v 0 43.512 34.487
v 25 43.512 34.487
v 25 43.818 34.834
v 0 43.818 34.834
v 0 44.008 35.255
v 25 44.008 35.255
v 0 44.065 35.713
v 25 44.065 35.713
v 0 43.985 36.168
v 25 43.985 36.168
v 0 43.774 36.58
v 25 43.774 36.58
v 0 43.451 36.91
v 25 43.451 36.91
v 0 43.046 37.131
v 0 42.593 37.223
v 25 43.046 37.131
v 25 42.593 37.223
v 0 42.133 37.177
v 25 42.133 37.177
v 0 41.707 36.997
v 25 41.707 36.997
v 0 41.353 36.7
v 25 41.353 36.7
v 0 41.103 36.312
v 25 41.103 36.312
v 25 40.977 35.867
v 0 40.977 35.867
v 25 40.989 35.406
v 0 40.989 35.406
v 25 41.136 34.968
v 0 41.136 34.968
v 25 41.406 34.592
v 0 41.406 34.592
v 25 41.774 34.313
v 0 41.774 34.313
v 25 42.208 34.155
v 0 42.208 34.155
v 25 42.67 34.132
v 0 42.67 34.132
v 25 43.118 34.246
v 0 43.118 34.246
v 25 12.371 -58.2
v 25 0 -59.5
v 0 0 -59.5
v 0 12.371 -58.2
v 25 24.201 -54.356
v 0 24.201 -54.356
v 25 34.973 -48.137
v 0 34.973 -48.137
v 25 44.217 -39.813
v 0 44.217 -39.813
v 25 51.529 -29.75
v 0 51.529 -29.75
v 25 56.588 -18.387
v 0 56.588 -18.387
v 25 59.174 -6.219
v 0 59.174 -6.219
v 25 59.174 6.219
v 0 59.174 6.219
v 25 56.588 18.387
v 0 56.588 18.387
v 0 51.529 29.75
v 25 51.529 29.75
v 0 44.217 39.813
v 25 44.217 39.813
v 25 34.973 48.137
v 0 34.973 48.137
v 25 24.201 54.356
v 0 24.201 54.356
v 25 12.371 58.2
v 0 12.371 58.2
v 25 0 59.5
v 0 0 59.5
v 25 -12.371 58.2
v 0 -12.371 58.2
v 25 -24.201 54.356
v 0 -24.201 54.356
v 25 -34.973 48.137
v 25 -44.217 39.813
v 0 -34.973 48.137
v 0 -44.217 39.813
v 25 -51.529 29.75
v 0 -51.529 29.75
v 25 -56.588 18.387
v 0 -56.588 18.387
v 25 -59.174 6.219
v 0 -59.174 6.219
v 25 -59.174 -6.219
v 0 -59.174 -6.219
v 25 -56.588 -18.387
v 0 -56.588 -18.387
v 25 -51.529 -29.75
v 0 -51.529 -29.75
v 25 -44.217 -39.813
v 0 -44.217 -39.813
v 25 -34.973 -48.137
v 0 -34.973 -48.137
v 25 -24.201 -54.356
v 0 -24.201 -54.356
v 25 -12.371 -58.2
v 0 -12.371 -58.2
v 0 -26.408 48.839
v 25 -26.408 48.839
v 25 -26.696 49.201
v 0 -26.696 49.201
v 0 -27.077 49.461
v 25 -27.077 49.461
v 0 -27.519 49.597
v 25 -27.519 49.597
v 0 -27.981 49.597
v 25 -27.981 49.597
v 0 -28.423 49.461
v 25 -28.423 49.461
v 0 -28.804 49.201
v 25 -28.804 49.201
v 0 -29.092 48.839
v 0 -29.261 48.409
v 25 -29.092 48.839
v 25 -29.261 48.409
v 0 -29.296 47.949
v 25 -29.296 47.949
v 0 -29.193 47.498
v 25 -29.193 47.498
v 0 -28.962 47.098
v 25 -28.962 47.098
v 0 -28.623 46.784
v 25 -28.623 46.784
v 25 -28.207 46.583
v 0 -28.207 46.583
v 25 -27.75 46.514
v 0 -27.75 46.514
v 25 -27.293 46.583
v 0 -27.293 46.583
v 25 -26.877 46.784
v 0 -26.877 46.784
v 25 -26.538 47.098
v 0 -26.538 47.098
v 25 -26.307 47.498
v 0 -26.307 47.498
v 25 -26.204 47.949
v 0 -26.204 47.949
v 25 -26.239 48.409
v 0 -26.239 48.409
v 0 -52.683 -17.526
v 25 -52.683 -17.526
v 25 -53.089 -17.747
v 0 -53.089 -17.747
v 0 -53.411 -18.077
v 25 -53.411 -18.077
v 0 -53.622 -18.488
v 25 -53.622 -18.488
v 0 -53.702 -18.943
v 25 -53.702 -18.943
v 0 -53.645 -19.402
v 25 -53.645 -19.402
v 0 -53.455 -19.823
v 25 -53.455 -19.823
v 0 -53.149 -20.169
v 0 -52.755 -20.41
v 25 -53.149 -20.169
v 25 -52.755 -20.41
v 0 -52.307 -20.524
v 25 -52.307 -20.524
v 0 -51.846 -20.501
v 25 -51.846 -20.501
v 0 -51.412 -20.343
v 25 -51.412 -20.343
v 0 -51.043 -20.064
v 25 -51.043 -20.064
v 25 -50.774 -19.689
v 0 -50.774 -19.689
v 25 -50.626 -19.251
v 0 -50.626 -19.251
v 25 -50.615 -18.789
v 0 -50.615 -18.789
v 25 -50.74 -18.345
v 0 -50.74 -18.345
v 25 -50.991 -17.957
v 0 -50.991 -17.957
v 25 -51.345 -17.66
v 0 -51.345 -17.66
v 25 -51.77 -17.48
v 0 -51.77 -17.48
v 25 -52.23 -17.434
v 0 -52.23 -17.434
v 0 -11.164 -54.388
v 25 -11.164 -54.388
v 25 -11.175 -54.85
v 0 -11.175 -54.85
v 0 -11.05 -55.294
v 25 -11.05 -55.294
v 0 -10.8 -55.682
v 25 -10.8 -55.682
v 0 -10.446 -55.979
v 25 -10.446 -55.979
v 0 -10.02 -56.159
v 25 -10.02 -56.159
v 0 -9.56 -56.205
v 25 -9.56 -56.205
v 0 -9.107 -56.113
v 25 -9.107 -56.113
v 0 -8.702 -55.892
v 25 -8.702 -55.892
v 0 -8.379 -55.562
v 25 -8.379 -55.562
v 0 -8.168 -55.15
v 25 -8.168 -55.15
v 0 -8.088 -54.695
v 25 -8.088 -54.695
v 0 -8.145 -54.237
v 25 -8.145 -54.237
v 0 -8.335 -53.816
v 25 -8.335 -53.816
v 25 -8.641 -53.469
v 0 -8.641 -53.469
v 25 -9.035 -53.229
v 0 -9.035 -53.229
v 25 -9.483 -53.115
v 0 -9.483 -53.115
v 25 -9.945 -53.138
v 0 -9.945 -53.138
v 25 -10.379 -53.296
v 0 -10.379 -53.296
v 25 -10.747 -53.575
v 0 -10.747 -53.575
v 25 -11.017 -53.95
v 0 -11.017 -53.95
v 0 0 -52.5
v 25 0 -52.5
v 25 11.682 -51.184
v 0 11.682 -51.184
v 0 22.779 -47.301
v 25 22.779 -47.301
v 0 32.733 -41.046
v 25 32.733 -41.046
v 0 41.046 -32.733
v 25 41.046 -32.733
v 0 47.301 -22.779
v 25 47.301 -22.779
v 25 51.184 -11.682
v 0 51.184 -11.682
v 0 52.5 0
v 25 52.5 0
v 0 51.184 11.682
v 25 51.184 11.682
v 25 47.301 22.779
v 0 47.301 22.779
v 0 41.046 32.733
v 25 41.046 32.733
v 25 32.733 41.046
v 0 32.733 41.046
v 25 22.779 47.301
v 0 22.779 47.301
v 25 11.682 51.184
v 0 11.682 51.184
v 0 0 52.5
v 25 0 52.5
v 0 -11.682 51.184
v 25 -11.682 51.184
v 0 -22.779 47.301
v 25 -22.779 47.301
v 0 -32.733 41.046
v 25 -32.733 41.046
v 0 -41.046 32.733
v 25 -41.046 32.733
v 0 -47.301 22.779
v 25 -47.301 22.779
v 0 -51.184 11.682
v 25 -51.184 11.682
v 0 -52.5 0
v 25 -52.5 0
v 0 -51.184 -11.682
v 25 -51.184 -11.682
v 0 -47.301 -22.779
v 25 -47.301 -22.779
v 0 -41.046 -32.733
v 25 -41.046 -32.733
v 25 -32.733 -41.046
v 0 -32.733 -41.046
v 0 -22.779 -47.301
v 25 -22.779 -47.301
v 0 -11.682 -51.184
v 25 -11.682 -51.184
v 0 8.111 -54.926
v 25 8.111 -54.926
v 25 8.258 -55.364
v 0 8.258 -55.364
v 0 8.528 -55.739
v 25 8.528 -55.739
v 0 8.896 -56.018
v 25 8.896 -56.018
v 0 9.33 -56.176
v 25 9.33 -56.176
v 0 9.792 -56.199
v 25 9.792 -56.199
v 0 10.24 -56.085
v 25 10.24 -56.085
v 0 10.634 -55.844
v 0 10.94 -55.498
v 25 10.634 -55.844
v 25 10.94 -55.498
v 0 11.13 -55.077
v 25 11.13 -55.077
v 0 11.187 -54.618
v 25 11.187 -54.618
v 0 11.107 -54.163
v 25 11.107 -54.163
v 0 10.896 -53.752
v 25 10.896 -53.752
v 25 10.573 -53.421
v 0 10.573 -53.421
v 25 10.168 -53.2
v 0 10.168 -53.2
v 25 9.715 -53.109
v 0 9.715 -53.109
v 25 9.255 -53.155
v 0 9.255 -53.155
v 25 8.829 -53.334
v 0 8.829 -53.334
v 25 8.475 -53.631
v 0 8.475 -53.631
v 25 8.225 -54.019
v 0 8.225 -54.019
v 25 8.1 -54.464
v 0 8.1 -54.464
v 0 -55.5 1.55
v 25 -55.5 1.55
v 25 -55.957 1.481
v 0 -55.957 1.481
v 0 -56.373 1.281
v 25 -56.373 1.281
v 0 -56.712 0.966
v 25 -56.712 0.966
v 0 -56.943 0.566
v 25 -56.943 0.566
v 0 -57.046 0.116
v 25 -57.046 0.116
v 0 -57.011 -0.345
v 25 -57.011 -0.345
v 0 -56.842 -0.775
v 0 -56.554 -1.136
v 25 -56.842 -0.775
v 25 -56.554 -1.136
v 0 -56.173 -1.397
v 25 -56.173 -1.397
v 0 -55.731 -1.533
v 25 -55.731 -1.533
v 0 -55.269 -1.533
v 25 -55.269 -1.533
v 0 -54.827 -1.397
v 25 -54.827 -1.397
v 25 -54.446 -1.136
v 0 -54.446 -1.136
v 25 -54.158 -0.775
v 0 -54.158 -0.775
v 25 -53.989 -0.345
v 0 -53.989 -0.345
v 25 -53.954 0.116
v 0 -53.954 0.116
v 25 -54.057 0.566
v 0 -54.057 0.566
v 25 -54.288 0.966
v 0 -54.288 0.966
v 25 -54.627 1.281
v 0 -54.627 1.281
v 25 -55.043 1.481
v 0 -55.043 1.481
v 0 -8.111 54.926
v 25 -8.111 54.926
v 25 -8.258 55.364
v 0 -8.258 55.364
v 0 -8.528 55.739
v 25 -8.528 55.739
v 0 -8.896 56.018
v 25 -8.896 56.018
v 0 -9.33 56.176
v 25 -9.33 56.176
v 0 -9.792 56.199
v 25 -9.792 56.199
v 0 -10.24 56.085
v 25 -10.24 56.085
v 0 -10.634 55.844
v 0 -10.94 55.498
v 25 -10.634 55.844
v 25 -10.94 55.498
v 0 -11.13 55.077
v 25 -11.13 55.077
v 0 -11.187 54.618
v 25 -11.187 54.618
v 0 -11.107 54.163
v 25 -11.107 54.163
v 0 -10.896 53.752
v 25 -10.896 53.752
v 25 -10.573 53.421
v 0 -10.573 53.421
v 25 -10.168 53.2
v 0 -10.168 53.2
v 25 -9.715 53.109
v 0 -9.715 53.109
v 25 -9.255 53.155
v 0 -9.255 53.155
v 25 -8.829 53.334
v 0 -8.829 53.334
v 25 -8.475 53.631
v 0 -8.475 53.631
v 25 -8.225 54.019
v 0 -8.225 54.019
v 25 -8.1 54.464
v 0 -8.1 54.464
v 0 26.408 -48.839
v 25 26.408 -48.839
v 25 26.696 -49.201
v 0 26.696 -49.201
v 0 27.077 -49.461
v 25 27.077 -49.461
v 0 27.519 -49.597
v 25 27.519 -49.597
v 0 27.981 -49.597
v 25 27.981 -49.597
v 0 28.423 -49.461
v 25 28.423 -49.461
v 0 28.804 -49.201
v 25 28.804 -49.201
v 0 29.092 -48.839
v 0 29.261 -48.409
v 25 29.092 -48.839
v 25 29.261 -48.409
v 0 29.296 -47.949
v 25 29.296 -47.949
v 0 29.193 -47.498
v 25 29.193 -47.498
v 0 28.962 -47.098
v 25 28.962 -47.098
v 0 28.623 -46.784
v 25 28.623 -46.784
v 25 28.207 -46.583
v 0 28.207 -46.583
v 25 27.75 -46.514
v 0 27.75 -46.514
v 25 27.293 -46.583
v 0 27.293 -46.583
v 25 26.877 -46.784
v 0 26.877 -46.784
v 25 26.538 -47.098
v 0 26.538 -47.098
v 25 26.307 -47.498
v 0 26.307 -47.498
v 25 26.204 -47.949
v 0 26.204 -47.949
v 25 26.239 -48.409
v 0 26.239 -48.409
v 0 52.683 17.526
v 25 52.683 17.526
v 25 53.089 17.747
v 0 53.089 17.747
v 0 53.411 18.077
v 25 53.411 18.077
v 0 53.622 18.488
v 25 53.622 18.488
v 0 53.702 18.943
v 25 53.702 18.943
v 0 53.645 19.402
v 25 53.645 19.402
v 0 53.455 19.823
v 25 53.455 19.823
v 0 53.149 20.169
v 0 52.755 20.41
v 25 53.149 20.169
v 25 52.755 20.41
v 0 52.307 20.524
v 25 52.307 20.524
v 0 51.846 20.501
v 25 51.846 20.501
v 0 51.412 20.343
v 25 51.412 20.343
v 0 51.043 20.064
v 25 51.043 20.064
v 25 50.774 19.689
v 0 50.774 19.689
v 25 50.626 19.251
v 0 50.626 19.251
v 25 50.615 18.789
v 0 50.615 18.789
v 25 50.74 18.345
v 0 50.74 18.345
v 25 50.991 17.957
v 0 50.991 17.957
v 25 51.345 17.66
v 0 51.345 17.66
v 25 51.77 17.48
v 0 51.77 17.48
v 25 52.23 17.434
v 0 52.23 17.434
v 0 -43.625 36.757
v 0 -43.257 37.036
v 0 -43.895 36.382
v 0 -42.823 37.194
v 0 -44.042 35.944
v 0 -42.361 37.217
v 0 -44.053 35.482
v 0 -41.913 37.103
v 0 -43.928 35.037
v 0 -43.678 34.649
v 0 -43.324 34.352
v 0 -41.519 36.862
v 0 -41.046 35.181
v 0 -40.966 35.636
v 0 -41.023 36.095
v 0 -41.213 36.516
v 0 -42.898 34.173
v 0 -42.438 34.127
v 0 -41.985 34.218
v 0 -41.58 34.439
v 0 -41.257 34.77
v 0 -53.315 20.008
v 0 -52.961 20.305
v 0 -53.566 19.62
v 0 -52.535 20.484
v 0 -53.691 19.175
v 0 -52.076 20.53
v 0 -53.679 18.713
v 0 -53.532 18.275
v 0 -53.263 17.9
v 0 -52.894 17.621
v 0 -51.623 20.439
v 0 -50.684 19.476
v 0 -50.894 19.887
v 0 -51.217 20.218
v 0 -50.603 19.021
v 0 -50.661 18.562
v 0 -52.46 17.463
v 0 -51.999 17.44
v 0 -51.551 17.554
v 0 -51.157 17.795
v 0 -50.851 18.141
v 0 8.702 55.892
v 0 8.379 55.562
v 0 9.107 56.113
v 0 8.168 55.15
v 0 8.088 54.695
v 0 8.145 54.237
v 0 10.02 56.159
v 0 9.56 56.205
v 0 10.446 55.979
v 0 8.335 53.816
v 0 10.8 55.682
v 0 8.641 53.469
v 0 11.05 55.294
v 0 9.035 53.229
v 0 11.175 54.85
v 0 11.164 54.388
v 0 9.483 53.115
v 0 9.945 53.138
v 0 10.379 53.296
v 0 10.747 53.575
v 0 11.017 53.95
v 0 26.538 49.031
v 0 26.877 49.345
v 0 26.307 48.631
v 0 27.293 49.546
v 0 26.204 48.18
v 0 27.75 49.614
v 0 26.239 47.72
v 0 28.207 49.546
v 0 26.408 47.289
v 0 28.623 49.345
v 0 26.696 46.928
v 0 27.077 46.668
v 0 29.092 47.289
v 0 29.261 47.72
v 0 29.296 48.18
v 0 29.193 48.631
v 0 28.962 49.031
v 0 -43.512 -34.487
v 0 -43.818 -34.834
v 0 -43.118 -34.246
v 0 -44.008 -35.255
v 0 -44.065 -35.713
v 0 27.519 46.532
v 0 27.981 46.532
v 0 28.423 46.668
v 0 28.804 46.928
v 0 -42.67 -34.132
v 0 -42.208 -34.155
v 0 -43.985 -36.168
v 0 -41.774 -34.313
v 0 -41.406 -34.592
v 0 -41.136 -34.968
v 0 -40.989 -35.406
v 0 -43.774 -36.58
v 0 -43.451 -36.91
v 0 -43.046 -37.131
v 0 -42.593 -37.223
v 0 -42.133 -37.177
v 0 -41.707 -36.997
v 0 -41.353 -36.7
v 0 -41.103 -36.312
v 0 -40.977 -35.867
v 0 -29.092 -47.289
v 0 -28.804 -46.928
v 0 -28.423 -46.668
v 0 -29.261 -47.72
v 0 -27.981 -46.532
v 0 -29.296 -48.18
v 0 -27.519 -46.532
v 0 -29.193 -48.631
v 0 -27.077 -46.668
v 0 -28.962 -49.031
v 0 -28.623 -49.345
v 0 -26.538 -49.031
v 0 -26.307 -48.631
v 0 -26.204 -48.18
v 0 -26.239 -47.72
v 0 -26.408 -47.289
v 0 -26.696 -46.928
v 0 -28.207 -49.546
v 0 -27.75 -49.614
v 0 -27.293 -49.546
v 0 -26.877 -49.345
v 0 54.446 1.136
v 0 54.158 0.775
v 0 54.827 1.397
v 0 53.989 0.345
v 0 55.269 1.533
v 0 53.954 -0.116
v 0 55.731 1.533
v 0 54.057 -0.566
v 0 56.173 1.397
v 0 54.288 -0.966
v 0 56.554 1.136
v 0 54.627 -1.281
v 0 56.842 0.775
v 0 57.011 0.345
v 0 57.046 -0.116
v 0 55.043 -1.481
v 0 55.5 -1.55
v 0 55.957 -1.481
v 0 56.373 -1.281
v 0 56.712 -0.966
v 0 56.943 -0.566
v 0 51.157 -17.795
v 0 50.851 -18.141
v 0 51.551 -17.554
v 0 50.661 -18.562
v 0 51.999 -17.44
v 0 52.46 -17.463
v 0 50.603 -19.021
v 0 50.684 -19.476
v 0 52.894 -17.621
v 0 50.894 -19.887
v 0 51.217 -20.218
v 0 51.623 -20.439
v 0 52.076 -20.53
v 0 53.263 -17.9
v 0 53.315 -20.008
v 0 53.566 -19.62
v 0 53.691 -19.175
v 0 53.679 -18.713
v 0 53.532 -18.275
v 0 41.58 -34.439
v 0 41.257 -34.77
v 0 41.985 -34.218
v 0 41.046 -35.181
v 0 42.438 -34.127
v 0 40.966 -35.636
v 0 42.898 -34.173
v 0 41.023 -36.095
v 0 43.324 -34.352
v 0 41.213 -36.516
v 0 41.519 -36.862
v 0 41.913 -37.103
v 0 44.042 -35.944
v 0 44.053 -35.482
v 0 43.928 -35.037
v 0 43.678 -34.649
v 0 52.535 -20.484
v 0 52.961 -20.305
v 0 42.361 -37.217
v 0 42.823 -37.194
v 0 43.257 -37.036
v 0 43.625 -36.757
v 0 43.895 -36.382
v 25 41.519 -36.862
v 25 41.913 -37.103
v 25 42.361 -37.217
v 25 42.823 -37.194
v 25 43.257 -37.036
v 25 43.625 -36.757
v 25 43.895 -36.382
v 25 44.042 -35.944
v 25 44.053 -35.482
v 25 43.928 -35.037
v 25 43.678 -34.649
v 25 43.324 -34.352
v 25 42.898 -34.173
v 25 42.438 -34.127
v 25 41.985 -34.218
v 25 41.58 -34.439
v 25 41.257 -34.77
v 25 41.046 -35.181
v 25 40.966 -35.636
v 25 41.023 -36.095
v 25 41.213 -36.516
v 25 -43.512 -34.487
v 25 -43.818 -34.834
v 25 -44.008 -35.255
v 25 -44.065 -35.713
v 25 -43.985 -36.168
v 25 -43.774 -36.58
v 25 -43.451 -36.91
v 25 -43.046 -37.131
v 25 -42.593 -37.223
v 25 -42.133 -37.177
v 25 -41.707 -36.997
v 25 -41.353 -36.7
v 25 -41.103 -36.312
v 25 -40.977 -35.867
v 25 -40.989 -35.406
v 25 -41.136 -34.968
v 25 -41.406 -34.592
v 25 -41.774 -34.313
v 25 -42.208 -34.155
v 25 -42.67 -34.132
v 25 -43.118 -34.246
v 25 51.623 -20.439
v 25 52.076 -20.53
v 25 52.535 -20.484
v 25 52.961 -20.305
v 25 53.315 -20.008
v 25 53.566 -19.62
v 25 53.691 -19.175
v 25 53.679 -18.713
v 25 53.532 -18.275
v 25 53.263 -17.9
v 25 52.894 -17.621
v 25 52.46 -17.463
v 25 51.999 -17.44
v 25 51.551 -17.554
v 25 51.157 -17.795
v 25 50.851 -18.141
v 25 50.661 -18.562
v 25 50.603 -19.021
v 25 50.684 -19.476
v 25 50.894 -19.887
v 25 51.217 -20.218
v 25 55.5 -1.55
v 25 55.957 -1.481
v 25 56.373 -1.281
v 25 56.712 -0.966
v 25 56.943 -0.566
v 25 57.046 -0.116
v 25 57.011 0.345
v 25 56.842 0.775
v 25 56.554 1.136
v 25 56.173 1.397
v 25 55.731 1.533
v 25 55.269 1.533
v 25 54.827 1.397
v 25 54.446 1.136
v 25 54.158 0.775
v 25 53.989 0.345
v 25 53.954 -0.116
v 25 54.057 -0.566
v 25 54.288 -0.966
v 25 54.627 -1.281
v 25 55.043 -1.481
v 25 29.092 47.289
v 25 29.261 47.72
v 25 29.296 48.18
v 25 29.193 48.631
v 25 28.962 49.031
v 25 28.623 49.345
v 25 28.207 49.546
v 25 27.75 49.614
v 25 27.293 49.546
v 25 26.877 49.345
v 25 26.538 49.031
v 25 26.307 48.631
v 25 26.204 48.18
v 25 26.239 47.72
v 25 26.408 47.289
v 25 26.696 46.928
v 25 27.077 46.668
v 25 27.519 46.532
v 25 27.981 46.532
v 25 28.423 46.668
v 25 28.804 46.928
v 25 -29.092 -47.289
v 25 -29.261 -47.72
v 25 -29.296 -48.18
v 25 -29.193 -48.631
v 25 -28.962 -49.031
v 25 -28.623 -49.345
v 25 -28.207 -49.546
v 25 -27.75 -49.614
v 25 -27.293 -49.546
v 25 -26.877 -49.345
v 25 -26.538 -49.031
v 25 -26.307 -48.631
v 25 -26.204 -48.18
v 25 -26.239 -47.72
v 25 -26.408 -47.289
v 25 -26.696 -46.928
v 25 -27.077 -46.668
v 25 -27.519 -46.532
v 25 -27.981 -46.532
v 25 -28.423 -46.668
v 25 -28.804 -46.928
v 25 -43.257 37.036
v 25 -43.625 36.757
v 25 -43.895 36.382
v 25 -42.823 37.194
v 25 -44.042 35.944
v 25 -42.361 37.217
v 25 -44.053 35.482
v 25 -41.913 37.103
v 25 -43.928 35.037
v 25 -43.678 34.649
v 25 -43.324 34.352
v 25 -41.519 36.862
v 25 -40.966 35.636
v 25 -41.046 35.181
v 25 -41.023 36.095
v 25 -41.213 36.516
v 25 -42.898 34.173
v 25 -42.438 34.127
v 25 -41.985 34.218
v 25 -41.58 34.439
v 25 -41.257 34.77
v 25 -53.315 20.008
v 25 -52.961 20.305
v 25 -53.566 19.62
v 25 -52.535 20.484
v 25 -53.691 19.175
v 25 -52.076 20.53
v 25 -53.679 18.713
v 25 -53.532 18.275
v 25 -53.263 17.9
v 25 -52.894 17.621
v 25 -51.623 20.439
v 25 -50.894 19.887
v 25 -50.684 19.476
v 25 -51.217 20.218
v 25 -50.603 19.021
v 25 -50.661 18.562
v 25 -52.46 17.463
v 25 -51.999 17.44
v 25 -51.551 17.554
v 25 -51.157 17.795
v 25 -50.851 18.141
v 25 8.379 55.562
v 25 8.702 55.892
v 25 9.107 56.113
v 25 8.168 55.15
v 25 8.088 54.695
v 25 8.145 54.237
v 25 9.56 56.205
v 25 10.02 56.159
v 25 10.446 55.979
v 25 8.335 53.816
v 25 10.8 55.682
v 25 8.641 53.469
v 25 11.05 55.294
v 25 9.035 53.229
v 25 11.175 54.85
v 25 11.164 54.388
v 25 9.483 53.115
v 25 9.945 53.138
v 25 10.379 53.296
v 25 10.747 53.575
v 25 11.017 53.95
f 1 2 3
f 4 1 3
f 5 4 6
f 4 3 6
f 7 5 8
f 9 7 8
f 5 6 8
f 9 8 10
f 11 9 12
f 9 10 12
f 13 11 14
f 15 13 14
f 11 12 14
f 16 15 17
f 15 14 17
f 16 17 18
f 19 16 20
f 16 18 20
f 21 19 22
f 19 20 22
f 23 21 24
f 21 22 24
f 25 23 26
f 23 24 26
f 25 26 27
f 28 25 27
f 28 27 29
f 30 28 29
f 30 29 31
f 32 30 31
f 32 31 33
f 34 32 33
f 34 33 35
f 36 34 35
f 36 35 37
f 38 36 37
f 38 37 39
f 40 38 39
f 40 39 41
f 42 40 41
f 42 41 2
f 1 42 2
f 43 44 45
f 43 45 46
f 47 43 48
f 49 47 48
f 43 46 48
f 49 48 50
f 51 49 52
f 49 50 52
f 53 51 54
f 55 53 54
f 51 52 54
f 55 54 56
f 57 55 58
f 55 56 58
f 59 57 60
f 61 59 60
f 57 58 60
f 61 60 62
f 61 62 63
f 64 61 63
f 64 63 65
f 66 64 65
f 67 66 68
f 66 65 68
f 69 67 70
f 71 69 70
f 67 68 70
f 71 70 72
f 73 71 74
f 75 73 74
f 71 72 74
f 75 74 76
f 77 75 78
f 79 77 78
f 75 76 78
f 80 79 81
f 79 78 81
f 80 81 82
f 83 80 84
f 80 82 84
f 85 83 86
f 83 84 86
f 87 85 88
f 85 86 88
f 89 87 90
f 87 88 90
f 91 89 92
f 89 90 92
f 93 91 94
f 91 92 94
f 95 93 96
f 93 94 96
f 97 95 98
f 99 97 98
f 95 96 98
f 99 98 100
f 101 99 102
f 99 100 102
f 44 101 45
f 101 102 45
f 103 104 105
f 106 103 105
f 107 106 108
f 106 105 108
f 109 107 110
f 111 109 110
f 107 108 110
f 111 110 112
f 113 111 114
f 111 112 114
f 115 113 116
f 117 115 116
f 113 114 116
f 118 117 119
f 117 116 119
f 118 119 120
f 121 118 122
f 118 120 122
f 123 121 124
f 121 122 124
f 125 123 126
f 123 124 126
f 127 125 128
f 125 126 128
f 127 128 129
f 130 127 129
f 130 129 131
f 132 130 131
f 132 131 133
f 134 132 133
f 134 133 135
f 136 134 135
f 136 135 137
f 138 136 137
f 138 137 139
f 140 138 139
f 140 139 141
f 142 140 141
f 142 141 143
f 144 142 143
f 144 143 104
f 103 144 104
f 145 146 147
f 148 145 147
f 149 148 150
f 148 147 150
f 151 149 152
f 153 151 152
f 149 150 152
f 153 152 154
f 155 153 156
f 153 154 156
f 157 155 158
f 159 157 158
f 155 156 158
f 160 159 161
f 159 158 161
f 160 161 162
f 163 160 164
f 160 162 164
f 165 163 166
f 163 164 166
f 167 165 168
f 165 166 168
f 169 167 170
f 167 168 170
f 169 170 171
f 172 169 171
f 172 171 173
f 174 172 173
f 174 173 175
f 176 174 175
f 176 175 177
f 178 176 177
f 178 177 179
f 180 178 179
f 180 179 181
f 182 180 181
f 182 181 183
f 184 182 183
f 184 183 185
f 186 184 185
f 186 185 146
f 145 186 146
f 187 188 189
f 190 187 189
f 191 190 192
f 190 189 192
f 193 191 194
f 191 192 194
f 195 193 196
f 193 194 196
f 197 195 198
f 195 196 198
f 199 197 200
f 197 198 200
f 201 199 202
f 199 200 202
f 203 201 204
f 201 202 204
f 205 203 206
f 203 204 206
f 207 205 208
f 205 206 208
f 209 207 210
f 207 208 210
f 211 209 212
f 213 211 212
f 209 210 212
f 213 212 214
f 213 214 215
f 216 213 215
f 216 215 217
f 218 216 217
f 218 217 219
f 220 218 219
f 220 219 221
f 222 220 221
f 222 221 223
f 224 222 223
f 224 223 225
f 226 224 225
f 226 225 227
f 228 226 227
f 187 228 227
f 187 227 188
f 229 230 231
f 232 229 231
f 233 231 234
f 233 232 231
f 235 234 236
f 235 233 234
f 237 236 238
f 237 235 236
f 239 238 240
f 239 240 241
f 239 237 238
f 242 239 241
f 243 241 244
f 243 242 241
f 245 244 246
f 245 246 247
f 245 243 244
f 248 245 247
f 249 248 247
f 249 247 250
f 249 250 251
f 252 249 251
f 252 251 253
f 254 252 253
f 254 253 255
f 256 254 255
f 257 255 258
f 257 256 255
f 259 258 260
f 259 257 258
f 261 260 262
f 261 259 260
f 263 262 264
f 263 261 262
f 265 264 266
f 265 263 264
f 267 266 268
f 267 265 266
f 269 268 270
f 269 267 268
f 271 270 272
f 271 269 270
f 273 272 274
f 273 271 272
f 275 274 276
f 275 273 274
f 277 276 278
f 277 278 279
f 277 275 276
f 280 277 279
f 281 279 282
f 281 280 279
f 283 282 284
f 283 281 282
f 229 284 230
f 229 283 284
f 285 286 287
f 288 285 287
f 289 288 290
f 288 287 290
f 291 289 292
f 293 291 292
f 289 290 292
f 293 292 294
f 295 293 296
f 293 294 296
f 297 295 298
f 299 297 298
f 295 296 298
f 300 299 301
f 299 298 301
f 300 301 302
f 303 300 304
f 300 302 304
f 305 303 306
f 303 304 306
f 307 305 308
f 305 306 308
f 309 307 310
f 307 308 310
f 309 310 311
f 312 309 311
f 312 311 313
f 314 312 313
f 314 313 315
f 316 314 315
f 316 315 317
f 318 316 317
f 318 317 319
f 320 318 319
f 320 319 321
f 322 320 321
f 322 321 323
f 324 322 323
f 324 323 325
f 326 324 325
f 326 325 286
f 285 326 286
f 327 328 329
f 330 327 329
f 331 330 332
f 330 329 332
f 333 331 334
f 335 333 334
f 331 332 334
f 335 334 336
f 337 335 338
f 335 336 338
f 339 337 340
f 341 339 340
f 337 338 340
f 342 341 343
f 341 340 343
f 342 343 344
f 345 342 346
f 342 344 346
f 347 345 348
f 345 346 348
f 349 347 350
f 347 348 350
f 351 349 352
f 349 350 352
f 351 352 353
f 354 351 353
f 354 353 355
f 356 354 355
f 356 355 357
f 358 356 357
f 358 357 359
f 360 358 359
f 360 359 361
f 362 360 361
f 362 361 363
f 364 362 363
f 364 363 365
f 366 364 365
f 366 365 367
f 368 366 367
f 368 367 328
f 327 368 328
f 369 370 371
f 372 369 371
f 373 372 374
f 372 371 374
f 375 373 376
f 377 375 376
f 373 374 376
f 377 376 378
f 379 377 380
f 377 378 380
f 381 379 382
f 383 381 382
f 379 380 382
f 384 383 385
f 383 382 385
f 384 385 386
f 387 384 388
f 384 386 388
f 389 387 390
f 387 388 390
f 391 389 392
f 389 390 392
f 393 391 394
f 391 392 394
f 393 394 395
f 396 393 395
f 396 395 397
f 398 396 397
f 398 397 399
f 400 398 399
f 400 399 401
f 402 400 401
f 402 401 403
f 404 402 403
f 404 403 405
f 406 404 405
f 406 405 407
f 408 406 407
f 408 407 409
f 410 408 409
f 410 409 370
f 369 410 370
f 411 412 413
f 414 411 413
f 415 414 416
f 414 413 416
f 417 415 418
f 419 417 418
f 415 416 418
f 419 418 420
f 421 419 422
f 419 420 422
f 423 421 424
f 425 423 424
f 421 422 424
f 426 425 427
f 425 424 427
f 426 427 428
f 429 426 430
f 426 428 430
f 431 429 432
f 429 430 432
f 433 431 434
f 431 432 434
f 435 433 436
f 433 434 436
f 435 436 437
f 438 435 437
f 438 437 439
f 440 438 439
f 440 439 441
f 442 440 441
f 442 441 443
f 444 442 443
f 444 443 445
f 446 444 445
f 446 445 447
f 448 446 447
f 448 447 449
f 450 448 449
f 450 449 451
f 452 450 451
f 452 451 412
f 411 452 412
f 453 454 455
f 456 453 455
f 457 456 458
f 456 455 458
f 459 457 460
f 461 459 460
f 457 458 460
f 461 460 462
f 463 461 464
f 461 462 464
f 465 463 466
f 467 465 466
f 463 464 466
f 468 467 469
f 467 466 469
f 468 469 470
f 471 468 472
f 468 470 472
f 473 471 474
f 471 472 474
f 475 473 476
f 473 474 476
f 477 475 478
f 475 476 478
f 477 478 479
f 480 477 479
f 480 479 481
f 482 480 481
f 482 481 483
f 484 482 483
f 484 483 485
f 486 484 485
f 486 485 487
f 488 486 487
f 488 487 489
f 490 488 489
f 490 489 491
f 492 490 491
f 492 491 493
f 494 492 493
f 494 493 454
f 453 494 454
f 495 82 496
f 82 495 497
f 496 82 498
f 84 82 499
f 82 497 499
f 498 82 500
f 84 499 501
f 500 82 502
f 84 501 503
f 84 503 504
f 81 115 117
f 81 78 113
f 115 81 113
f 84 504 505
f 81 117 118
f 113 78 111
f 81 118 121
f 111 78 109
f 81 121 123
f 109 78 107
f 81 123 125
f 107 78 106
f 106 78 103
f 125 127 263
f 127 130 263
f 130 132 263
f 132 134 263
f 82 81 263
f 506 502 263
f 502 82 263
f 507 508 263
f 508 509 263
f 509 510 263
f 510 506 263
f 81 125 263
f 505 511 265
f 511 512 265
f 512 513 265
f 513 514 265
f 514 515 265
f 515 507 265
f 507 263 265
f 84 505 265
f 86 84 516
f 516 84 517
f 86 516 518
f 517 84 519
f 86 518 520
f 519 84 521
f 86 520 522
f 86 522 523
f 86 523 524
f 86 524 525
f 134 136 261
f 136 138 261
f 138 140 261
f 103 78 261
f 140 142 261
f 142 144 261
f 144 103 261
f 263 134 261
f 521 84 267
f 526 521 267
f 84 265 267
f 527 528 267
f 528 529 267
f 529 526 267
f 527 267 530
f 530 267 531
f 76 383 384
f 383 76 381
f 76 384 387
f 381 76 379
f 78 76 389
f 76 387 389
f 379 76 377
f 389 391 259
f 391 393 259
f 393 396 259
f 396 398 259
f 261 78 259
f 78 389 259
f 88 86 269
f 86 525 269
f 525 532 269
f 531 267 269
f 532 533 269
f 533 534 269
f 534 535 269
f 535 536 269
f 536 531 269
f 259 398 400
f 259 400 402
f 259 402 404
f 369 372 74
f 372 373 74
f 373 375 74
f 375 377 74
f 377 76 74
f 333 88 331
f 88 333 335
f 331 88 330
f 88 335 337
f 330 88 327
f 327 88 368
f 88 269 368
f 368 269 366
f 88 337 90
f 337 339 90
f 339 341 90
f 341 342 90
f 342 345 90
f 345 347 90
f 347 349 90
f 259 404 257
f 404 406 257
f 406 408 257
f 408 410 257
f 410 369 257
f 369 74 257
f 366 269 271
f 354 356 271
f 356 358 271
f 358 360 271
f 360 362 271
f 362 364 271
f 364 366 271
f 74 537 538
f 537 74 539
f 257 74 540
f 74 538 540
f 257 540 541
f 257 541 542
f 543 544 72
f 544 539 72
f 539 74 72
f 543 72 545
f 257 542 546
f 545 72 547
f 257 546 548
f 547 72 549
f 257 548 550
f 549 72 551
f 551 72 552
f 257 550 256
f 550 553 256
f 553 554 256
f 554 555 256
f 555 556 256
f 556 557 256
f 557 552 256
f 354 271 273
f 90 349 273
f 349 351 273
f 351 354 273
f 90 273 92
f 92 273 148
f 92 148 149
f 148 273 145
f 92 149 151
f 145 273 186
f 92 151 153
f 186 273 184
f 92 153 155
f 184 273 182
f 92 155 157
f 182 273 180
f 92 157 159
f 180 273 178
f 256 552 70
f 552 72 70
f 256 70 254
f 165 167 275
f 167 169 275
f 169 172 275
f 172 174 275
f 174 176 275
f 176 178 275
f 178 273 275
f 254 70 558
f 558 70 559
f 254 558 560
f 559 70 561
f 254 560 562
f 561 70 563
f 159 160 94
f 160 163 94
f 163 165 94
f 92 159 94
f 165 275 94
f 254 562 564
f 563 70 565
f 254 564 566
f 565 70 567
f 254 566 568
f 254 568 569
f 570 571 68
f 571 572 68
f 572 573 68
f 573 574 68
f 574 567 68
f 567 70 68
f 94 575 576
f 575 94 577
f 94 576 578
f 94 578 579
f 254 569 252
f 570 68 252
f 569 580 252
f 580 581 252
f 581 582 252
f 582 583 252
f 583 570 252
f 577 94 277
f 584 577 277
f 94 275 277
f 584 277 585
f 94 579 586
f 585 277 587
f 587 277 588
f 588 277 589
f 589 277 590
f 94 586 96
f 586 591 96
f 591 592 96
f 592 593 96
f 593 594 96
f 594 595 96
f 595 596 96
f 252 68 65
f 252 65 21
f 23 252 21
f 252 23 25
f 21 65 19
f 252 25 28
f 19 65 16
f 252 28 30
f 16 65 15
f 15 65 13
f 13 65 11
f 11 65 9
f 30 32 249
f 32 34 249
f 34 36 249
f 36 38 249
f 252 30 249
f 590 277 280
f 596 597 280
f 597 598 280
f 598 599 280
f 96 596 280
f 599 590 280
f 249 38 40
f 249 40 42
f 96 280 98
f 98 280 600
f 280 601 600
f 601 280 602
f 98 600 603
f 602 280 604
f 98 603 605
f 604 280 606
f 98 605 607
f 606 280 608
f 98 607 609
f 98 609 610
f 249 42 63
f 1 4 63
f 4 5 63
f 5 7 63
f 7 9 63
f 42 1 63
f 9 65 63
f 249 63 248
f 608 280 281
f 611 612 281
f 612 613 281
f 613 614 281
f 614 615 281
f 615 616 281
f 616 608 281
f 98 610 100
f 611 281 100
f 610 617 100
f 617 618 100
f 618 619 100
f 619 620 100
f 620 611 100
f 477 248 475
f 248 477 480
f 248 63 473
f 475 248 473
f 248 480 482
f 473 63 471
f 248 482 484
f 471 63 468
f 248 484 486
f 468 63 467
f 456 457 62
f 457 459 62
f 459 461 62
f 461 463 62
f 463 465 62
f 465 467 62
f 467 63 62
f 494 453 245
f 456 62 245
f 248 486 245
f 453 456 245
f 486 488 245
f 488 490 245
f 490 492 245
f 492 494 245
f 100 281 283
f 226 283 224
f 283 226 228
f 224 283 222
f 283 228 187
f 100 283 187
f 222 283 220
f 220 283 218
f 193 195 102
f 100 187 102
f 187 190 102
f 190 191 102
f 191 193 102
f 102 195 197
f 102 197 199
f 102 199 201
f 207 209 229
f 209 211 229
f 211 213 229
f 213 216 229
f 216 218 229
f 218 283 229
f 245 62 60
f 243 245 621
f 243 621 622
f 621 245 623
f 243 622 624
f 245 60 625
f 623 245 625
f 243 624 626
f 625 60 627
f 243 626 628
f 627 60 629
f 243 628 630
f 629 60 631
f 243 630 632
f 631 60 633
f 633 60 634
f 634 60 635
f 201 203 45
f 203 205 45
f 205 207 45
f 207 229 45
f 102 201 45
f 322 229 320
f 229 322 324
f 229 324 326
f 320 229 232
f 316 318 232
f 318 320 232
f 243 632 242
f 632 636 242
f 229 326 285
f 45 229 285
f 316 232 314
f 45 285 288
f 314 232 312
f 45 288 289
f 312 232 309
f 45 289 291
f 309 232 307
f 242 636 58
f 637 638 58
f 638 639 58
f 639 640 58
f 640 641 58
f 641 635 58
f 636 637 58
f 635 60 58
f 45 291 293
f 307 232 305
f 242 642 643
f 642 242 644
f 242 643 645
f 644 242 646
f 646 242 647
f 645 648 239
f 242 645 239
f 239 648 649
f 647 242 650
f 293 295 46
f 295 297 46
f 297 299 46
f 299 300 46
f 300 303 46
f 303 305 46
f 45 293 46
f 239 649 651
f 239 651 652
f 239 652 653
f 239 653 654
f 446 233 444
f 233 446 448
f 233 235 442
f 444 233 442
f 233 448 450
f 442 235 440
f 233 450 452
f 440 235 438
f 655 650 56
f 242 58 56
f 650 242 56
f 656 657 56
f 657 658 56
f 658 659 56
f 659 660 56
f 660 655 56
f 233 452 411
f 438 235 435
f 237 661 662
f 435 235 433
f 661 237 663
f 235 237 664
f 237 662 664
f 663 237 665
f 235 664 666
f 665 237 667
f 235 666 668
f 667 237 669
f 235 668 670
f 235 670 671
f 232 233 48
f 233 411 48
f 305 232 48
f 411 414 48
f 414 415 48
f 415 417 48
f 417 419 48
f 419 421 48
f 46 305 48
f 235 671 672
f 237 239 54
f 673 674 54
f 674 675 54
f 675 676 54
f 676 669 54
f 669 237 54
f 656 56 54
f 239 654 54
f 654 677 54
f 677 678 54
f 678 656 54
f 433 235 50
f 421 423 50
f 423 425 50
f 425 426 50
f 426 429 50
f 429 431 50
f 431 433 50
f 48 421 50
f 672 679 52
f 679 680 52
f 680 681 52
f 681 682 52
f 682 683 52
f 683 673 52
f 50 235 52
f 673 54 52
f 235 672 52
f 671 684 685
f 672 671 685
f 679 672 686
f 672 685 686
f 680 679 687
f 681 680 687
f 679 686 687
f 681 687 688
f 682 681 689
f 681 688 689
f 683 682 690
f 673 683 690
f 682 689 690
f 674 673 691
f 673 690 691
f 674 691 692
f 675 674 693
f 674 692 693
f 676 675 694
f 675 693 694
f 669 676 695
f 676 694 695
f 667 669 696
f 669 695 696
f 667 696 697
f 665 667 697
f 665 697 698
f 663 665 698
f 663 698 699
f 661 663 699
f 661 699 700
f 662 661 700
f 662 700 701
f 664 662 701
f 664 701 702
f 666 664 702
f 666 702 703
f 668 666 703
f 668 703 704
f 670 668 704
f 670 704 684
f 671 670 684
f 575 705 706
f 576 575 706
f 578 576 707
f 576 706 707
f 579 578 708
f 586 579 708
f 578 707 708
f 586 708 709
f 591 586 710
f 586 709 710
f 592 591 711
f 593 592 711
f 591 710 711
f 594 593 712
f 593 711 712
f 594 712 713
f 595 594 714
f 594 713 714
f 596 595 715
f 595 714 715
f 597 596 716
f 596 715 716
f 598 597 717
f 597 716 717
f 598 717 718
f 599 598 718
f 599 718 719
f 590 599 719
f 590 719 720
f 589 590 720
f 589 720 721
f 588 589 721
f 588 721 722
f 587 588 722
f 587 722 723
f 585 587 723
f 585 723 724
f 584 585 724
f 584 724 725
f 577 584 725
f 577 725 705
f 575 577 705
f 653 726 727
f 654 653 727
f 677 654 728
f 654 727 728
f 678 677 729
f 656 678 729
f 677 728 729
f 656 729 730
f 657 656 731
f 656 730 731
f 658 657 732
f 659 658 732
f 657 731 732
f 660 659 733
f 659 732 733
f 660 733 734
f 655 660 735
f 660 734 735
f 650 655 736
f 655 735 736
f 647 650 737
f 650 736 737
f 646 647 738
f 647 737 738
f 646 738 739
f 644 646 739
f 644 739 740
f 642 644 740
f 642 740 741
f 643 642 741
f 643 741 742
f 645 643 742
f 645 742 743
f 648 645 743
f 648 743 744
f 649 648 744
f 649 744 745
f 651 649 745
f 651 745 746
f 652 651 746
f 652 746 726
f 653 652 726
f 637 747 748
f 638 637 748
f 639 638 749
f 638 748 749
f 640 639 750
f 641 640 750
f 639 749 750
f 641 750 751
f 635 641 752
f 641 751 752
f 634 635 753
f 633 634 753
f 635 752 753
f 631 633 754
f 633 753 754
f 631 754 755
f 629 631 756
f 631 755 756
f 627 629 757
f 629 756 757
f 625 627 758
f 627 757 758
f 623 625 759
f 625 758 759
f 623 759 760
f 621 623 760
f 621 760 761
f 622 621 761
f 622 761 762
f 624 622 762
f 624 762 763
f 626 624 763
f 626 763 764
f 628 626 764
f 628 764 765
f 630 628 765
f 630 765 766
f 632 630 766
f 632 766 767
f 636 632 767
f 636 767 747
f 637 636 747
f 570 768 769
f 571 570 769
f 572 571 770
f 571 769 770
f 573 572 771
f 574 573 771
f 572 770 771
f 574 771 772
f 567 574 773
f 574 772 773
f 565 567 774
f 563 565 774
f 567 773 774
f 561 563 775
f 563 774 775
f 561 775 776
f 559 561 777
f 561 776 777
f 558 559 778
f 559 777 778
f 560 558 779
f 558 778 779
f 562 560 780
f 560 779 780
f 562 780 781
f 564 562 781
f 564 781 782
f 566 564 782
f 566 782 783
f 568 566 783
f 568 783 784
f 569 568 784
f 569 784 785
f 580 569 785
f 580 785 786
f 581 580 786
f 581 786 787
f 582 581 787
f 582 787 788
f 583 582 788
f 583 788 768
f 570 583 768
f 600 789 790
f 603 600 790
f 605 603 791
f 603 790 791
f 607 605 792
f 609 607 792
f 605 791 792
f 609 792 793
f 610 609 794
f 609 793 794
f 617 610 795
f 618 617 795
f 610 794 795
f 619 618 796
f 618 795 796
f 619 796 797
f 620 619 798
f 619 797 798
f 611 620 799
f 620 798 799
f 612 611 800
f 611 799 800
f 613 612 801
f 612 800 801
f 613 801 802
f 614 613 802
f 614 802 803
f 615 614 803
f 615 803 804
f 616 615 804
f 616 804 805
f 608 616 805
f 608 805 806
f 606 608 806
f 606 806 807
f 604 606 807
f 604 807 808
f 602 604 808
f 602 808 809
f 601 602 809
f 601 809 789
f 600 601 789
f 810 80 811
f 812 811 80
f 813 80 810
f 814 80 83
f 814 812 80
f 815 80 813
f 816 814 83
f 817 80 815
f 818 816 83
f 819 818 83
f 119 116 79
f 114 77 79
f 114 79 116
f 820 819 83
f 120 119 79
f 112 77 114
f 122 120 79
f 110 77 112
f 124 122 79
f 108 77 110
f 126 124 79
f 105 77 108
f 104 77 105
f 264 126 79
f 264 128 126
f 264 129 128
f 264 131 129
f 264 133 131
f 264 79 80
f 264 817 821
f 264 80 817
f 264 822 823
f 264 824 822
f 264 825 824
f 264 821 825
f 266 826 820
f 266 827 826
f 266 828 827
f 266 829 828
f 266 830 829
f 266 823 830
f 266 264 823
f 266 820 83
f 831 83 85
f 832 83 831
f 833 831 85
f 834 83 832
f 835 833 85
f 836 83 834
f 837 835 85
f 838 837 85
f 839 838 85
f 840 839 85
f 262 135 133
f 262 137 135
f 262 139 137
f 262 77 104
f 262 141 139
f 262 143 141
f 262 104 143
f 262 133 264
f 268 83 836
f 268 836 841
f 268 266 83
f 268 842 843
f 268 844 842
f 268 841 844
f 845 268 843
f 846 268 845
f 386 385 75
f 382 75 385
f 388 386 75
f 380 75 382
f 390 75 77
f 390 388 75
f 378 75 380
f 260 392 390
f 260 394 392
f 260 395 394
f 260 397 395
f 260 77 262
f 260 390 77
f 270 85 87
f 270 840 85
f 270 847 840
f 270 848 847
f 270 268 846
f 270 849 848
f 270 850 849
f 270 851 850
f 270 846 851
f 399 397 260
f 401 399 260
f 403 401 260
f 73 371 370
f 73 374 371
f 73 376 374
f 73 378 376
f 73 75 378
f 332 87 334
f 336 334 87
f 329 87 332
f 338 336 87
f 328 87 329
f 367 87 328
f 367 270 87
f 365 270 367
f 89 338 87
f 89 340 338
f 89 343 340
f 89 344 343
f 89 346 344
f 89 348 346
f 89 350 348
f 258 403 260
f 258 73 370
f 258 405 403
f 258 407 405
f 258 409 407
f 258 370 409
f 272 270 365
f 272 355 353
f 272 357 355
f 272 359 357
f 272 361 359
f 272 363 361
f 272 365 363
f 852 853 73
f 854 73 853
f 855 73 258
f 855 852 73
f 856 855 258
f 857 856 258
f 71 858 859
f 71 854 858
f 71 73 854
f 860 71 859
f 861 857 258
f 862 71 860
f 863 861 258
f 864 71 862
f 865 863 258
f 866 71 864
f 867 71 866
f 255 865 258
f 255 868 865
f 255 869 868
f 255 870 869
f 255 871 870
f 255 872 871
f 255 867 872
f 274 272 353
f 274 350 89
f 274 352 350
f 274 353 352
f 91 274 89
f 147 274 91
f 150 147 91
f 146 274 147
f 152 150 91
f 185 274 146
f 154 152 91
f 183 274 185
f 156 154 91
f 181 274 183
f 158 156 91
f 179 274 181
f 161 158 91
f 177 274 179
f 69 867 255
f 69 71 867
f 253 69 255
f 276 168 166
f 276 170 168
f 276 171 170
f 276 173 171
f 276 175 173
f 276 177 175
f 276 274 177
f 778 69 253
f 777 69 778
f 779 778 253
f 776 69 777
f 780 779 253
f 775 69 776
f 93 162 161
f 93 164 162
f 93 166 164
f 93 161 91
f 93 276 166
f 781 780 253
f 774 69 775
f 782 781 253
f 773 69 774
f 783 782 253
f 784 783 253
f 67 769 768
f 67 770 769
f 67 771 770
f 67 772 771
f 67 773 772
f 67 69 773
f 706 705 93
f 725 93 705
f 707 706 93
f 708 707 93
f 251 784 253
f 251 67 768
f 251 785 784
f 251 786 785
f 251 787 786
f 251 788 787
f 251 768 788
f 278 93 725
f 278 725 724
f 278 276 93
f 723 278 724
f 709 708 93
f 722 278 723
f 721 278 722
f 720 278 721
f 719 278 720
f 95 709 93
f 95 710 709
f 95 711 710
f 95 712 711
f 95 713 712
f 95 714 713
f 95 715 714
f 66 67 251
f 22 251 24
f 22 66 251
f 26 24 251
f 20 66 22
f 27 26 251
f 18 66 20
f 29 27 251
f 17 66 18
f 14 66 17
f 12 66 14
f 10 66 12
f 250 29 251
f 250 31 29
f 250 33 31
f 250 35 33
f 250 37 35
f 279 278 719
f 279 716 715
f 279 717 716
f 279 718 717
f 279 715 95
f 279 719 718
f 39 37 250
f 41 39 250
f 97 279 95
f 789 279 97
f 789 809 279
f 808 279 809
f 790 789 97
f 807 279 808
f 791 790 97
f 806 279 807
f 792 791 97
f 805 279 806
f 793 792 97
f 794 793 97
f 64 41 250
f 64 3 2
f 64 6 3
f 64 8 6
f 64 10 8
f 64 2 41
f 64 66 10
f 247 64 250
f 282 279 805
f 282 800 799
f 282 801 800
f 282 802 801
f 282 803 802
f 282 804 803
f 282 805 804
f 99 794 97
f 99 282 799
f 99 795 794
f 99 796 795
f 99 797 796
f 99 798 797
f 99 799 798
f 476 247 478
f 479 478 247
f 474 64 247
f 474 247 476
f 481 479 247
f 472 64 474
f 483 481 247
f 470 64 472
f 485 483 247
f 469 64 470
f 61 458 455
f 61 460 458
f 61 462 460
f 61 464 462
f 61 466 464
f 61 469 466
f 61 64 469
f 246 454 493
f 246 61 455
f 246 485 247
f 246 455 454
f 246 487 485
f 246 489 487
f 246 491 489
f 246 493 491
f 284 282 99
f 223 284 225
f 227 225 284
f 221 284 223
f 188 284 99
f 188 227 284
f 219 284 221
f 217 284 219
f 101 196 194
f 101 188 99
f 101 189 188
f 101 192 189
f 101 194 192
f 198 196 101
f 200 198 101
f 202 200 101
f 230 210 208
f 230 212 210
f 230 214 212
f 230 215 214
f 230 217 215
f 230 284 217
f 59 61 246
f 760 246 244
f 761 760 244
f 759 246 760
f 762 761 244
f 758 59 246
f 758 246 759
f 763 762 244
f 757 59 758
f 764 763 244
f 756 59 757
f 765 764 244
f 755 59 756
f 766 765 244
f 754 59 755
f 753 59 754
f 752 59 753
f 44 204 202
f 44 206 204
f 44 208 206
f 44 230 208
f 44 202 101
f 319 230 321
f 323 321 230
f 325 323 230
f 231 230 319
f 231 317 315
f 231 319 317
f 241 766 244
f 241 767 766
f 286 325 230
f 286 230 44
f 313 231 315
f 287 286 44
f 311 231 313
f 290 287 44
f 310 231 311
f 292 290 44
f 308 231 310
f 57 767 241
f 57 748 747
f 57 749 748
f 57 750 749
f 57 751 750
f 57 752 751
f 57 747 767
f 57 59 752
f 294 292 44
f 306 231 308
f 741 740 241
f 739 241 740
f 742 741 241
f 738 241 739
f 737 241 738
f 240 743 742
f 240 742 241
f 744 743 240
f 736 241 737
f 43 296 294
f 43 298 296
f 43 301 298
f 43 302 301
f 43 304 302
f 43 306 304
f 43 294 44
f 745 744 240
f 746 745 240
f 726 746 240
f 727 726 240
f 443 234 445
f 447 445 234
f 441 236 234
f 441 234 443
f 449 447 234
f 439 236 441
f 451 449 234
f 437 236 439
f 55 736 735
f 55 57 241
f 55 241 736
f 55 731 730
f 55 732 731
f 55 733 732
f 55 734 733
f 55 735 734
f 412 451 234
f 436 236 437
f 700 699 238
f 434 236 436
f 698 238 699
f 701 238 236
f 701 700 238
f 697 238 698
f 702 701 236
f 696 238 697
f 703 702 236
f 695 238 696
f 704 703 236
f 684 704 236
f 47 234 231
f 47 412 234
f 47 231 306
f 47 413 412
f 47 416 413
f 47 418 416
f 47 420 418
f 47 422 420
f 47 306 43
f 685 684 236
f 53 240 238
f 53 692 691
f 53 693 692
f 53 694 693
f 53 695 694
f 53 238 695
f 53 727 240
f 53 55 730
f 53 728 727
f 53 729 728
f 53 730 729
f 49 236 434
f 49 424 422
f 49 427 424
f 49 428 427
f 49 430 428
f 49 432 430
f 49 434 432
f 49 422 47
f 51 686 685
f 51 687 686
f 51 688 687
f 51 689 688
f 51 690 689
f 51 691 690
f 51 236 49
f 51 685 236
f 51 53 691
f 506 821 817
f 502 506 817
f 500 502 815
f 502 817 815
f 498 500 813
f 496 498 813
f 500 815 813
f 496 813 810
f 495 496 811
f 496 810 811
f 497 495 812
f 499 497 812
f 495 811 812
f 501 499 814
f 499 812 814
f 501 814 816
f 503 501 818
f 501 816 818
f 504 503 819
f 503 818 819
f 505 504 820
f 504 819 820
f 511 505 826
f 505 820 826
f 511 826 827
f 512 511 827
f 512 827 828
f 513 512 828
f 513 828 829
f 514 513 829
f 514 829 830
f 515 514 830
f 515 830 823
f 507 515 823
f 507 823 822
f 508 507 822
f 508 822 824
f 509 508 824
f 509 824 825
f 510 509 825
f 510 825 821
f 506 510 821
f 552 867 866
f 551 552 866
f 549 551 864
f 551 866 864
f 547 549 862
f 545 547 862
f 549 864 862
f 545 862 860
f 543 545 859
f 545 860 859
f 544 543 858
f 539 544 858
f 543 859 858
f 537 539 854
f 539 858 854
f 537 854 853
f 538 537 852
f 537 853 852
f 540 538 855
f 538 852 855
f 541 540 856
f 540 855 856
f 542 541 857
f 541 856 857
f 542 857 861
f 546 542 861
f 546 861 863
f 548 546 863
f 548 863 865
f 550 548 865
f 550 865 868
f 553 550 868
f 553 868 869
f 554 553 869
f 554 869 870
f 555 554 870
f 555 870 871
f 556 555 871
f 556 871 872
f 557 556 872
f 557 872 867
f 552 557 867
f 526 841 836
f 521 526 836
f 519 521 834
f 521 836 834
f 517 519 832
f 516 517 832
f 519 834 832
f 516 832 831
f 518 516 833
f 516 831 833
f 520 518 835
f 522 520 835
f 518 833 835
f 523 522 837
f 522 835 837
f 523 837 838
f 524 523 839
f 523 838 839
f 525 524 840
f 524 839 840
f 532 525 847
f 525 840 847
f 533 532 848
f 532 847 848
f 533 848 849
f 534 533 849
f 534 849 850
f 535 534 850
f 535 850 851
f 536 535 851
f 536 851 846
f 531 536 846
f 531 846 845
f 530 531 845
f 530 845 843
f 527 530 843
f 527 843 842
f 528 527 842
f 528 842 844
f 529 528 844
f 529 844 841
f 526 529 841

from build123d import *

# Parameters (mm, degrees)
SKETCH_1_R               = 59.5
SKETCH_1_R_2             = 52.5
EXTRUDE_1_DEPTH          = 25
SKETCH_2_R               = 1.55
CUT_EXTRUDE_1_DEPTH      = 88.780977438
PATTERN_CIRCULAR_1_COUNT = 18


with BuildPart() as part:
    # 草图1 → 凸台-拉伸1 (new body)
    with BuildSketch(Plane(origin=(0, 0, 0), x_dir=(0, 0, -1), z_dir=(1, 0, 0))):
        Circle(SKETCH_1_R)
        Circle(SKETCH_1_R_2, mode=Mode.SUBTRACT)
    extrude(amount=EXTRUDE_1_DEPTH)

    # 草图2 → 切除-拉伸1 (cut, through all)
    with BuildSketch(Plane(origin=(25, 0, 0), x_dir=(0, 0, -1), z_dir=(1, 0, 0))):
        with Locations((0, 55.5)):
            Circle(SKETCH_2_R)
    cut_extrude_1 = extrude(amount=-CUT_EXTRUDE_1_DEPTH, mode=Mode.SUBTRACT)

    # 阵列(圆周)1: 切除-拉伸1 ×18 about axis
    pattern_circular_1_axis = Axis((0, 0, 0), (1, 0, 0))
    for i in range(1, PATTERN_CIRCULAR_1_COUNT):
        add(cut_extrude_1.rotate(pattern_circular_1_axis, i * 360 / PATTERN_CIRCULAR_1_COUNT), mode=Mode.SUBTRACT)


solid = part.part
